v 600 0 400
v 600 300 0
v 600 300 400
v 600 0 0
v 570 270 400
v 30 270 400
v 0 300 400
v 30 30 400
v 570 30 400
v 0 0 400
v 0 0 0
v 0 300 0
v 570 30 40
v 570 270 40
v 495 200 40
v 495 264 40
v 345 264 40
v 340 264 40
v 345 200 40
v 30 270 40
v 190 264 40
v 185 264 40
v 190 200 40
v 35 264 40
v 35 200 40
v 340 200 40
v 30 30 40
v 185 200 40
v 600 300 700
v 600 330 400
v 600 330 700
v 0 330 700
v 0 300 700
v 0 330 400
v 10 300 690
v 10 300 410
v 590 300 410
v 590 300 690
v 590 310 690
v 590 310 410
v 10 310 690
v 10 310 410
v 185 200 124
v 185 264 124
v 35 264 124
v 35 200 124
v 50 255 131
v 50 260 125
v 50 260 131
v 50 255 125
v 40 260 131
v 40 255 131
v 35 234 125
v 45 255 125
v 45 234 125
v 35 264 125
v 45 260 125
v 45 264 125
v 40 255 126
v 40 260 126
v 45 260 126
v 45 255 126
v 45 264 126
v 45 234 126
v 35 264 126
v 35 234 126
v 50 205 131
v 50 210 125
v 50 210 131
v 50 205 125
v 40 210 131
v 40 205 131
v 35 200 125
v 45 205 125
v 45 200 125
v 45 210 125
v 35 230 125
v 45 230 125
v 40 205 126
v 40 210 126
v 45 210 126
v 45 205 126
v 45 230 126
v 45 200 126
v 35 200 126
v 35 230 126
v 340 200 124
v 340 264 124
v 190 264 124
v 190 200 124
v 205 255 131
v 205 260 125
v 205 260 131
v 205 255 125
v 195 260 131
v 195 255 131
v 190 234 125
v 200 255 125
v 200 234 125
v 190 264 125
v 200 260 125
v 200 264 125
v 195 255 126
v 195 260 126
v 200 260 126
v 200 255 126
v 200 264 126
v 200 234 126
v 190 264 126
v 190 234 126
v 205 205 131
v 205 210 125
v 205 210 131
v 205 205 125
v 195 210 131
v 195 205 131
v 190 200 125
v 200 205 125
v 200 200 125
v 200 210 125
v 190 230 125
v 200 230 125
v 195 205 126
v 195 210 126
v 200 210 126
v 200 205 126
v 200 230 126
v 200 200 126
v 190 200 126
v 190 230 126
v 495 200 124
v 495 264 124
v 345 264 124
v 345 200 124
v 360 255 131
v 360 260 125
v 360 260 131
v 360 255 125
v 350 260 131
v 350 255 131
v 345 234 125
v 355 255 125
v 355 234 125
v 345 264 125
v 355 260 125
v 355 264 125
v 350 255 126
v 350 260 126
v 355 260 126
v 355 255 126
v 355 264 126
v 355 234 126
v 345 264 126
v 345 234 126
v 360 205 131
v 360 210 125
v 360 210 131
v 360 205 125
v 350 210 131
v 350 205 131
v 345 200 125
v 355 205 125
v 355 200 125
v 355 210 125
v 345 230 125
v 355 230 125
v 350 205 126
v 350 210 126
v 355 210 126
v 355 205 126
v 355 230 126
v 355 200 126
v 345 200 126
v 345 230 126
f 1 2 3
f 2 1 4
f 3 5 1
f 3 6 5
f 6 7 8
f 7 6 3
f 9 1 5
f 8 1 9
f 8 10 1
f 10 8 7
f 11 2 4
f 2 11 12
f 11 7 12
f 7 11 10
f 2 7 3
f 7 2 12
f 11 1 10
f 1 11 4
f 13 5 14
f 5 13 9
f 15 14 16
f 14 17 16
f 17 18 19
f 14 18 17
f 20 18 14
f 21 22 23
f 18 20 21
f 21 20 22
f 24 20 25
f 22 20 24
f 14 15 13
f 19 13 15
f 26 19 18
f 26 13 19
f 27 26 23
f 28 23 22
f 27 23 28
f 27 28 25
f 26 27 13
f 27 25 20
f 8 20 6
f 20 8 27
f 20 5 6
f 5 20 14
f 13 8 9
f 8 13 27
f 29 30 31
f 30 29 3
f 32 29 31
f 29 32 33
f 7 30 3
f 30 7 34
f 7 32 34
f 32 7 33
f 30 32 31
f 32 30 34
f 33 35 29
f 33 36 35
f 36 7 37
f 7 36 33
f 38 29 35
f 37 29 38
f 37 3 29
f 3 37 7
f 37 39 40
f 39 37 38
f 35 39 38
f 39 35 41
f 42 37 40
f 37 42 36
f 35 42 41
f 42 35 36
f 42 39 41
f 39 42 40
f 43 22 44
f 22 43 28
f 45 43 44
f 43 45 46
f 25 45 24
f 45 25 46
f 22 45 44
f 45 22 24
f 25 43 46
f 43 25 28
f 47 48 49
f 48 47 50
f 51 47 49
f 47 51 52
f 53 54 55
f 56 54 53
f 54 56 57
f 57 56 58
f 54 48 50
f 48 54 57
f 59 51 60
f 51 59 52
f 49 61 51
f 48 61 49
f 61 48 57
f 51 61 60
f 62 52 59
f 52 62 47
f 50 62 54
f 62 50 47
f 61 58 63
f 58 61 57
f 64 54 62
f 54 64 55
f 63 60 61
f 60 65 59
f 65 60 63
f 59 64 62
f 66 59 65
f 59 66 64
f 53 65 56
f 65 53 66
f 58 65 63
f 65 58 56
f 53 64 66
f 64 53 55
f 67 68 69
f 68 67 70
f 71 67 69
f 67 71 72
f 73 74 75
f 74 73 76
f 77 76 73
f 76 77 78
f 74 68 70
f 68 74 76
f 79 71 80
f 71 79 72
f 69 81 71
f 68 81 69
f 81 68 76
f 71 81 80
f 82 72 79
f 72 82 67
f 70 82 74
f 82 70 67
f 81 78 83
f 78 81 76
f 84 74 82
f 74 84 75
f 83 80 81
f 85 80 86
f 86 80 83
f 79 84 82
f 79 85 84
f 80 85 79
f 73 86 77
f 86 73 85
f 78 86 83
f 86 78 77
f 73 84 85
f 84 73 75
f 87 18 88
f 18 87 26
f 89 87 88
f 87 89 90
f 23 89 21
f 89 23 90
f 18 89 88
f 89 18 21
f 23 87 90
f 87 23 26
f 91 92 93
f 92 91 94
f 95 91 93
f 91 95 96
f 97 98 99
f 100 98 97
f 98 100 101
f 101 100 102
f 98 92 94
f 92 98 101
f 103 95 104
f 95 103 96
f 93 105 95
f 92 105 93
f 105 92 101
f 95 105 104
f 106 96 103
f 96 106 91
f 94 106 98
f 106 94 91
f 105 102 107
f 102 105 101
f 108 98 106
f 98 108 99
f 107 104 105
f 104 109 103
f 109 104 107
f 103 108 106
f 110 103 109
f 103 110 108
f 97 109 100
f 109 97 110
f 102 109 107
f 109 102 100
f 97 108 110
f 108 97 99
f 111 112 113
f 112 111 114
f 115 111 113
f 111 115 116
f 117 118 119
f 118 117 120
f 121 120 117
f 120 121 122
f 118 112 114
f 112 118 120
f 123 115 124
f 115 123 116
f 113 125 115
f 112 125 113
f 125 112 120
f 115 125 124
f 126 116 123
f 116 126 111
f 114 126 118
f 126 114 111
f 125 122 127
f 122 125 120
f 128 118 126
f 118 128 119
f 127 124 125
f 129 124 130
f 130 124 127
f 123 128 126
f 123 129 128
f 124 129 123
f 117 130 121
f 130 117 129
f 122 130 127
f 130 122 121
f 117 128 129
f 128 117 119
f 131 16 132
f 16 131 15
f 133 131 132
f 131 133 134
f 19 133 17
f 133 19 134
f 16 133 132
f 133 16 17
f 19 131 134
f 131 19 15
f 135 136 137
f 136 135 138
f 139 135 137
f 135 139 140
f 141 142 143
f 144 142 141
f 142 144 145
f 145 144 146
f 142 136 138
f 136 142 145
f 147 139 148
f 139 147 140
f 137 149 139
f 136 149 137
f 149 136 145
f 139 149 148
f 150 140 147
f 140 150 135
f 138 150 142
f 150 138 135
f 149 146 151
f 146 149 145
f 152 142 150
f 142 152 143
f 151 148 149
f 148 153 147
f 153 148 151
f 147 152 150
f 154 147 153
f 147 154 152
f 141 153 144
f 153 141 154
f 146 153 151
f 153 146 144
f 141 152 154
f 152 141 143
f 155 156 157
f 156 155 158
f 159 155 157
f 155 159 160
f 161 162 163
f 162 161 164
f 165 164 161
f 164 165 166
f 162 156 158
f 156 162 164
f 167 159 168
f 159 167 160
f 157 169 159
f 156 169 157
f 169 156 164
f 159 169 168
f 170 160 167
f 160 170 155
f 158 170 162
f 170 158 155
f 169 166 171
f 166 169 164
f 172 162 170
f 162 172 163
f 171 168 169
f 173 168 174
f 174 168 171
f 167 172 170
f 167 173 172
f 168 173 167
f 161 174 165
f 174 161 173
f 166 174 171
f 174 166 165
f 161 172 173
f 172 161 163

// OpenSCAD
module kiste(x,y,z){ difference() {
    color([0.1,0.4,0.0]) cube([x,y,z]);
    color([0.5,0.5,0.5]) translate([30,30,40]) cube([x-60,y-60,z]);
}
difference() {
color([0.1,0.4,0.0]) translate([0,y,z]) cube([x,30,y]);
color([0.5,0.5,0.5]) translate([10,y-10,z+10]) cube([x-20,20,y-20]);
}
}

module 2m_TXRX(x,y,z) {
translate([x,y,z]) {
 color([0.1,0.1,0.1]) cube([300,140,240]);
    
 translate([140,75,240]) color([0.7,0.7,0.7]) cylinder(40,r=30,center=true);
 translate([220,50,240]) color([0.7,0.7,0.7]) cylinder(25,r=10,center=true);
 translate([260,50,240]) color([0.7,0.7,0.7]) cylinder(15,r=10,center=true);
 
 translate ([10,20,240]) color([0.2,0.0,0.8]) cube([80,100,2]);
    
}
}

module bleiakku(x,y,z) {
    translate([x,y,z]) { 
        color([0,0,0]) cube([150,64,94]);
        
        translate([5,55,95]) color([0.5,0.5,0.5]) cube([10,5,6]);    
        translate([0,34,95]) color([1,0,0]) cube([10,30,1]); 
        
        translate([5,5,95]) color([0.5,0.5,0.5]) cube([10,5,6]);    
        translate([0,0,95]) color([0,0,1]) cube([10,30,1]); 
    }
}

module KWTXRX(x,y,z) {
translate([x,y,z]) {
    difference() {
        color([0.1,0.1,0.1]) cube([240,93,240]);
        color([0.2,0.2,0.2]) translate([10,79,0]) cube([220,15,150]);
    }
    for(i = [1:11])
   color([0.4,0.4,0.4]) translate([i*20,79,0]) cube([2,14,150]);
    
   translate([160,30,240]) color([0.7,0.7,0.7]) cylinder(25,r=23,center=true);
  translate([12,12,240]) color([0.7,0.7,0.7]) cylinder(5,d=16,center=true);
 translate ([20,60,240]) color([0.2,0.0,0.8]) cube([150,25,2]);
    
    translate ([205,50,-15]) color([0.7,0.7,0.7]) cube([15,20,15]);
    
   translate([32,55,-5]) color([0.7,0.7,0.7]) cylinder(5,d=15,center=true);
}
}

//TODO
module KWTUNER(x,y,z) {
translate([x,y,z]) {
    
        color([0.1,0.1,0.1]) cube([240,93,240]);
    
 translate ([50,55,240]) color([0.2,0.0,0.8]) cube([175,35,2]);
    
    translate ([205,50,-15]) color([0.7,0.7,0.7]) cube([15,20,15]);
    
   translate([32,55,-5]) color([0.7,0.7,0.7]) cylinder(5,d=15,center=true);
}
}

kiste(600,300,400);
//2m_TXRX(35,35,120);
bleiakku(35,200,30);
bleiakku(190,200,30);
bleiakku(345,200,30);
//KWTXRX(35,180,160);
//KWTUNER(280,180,160);
